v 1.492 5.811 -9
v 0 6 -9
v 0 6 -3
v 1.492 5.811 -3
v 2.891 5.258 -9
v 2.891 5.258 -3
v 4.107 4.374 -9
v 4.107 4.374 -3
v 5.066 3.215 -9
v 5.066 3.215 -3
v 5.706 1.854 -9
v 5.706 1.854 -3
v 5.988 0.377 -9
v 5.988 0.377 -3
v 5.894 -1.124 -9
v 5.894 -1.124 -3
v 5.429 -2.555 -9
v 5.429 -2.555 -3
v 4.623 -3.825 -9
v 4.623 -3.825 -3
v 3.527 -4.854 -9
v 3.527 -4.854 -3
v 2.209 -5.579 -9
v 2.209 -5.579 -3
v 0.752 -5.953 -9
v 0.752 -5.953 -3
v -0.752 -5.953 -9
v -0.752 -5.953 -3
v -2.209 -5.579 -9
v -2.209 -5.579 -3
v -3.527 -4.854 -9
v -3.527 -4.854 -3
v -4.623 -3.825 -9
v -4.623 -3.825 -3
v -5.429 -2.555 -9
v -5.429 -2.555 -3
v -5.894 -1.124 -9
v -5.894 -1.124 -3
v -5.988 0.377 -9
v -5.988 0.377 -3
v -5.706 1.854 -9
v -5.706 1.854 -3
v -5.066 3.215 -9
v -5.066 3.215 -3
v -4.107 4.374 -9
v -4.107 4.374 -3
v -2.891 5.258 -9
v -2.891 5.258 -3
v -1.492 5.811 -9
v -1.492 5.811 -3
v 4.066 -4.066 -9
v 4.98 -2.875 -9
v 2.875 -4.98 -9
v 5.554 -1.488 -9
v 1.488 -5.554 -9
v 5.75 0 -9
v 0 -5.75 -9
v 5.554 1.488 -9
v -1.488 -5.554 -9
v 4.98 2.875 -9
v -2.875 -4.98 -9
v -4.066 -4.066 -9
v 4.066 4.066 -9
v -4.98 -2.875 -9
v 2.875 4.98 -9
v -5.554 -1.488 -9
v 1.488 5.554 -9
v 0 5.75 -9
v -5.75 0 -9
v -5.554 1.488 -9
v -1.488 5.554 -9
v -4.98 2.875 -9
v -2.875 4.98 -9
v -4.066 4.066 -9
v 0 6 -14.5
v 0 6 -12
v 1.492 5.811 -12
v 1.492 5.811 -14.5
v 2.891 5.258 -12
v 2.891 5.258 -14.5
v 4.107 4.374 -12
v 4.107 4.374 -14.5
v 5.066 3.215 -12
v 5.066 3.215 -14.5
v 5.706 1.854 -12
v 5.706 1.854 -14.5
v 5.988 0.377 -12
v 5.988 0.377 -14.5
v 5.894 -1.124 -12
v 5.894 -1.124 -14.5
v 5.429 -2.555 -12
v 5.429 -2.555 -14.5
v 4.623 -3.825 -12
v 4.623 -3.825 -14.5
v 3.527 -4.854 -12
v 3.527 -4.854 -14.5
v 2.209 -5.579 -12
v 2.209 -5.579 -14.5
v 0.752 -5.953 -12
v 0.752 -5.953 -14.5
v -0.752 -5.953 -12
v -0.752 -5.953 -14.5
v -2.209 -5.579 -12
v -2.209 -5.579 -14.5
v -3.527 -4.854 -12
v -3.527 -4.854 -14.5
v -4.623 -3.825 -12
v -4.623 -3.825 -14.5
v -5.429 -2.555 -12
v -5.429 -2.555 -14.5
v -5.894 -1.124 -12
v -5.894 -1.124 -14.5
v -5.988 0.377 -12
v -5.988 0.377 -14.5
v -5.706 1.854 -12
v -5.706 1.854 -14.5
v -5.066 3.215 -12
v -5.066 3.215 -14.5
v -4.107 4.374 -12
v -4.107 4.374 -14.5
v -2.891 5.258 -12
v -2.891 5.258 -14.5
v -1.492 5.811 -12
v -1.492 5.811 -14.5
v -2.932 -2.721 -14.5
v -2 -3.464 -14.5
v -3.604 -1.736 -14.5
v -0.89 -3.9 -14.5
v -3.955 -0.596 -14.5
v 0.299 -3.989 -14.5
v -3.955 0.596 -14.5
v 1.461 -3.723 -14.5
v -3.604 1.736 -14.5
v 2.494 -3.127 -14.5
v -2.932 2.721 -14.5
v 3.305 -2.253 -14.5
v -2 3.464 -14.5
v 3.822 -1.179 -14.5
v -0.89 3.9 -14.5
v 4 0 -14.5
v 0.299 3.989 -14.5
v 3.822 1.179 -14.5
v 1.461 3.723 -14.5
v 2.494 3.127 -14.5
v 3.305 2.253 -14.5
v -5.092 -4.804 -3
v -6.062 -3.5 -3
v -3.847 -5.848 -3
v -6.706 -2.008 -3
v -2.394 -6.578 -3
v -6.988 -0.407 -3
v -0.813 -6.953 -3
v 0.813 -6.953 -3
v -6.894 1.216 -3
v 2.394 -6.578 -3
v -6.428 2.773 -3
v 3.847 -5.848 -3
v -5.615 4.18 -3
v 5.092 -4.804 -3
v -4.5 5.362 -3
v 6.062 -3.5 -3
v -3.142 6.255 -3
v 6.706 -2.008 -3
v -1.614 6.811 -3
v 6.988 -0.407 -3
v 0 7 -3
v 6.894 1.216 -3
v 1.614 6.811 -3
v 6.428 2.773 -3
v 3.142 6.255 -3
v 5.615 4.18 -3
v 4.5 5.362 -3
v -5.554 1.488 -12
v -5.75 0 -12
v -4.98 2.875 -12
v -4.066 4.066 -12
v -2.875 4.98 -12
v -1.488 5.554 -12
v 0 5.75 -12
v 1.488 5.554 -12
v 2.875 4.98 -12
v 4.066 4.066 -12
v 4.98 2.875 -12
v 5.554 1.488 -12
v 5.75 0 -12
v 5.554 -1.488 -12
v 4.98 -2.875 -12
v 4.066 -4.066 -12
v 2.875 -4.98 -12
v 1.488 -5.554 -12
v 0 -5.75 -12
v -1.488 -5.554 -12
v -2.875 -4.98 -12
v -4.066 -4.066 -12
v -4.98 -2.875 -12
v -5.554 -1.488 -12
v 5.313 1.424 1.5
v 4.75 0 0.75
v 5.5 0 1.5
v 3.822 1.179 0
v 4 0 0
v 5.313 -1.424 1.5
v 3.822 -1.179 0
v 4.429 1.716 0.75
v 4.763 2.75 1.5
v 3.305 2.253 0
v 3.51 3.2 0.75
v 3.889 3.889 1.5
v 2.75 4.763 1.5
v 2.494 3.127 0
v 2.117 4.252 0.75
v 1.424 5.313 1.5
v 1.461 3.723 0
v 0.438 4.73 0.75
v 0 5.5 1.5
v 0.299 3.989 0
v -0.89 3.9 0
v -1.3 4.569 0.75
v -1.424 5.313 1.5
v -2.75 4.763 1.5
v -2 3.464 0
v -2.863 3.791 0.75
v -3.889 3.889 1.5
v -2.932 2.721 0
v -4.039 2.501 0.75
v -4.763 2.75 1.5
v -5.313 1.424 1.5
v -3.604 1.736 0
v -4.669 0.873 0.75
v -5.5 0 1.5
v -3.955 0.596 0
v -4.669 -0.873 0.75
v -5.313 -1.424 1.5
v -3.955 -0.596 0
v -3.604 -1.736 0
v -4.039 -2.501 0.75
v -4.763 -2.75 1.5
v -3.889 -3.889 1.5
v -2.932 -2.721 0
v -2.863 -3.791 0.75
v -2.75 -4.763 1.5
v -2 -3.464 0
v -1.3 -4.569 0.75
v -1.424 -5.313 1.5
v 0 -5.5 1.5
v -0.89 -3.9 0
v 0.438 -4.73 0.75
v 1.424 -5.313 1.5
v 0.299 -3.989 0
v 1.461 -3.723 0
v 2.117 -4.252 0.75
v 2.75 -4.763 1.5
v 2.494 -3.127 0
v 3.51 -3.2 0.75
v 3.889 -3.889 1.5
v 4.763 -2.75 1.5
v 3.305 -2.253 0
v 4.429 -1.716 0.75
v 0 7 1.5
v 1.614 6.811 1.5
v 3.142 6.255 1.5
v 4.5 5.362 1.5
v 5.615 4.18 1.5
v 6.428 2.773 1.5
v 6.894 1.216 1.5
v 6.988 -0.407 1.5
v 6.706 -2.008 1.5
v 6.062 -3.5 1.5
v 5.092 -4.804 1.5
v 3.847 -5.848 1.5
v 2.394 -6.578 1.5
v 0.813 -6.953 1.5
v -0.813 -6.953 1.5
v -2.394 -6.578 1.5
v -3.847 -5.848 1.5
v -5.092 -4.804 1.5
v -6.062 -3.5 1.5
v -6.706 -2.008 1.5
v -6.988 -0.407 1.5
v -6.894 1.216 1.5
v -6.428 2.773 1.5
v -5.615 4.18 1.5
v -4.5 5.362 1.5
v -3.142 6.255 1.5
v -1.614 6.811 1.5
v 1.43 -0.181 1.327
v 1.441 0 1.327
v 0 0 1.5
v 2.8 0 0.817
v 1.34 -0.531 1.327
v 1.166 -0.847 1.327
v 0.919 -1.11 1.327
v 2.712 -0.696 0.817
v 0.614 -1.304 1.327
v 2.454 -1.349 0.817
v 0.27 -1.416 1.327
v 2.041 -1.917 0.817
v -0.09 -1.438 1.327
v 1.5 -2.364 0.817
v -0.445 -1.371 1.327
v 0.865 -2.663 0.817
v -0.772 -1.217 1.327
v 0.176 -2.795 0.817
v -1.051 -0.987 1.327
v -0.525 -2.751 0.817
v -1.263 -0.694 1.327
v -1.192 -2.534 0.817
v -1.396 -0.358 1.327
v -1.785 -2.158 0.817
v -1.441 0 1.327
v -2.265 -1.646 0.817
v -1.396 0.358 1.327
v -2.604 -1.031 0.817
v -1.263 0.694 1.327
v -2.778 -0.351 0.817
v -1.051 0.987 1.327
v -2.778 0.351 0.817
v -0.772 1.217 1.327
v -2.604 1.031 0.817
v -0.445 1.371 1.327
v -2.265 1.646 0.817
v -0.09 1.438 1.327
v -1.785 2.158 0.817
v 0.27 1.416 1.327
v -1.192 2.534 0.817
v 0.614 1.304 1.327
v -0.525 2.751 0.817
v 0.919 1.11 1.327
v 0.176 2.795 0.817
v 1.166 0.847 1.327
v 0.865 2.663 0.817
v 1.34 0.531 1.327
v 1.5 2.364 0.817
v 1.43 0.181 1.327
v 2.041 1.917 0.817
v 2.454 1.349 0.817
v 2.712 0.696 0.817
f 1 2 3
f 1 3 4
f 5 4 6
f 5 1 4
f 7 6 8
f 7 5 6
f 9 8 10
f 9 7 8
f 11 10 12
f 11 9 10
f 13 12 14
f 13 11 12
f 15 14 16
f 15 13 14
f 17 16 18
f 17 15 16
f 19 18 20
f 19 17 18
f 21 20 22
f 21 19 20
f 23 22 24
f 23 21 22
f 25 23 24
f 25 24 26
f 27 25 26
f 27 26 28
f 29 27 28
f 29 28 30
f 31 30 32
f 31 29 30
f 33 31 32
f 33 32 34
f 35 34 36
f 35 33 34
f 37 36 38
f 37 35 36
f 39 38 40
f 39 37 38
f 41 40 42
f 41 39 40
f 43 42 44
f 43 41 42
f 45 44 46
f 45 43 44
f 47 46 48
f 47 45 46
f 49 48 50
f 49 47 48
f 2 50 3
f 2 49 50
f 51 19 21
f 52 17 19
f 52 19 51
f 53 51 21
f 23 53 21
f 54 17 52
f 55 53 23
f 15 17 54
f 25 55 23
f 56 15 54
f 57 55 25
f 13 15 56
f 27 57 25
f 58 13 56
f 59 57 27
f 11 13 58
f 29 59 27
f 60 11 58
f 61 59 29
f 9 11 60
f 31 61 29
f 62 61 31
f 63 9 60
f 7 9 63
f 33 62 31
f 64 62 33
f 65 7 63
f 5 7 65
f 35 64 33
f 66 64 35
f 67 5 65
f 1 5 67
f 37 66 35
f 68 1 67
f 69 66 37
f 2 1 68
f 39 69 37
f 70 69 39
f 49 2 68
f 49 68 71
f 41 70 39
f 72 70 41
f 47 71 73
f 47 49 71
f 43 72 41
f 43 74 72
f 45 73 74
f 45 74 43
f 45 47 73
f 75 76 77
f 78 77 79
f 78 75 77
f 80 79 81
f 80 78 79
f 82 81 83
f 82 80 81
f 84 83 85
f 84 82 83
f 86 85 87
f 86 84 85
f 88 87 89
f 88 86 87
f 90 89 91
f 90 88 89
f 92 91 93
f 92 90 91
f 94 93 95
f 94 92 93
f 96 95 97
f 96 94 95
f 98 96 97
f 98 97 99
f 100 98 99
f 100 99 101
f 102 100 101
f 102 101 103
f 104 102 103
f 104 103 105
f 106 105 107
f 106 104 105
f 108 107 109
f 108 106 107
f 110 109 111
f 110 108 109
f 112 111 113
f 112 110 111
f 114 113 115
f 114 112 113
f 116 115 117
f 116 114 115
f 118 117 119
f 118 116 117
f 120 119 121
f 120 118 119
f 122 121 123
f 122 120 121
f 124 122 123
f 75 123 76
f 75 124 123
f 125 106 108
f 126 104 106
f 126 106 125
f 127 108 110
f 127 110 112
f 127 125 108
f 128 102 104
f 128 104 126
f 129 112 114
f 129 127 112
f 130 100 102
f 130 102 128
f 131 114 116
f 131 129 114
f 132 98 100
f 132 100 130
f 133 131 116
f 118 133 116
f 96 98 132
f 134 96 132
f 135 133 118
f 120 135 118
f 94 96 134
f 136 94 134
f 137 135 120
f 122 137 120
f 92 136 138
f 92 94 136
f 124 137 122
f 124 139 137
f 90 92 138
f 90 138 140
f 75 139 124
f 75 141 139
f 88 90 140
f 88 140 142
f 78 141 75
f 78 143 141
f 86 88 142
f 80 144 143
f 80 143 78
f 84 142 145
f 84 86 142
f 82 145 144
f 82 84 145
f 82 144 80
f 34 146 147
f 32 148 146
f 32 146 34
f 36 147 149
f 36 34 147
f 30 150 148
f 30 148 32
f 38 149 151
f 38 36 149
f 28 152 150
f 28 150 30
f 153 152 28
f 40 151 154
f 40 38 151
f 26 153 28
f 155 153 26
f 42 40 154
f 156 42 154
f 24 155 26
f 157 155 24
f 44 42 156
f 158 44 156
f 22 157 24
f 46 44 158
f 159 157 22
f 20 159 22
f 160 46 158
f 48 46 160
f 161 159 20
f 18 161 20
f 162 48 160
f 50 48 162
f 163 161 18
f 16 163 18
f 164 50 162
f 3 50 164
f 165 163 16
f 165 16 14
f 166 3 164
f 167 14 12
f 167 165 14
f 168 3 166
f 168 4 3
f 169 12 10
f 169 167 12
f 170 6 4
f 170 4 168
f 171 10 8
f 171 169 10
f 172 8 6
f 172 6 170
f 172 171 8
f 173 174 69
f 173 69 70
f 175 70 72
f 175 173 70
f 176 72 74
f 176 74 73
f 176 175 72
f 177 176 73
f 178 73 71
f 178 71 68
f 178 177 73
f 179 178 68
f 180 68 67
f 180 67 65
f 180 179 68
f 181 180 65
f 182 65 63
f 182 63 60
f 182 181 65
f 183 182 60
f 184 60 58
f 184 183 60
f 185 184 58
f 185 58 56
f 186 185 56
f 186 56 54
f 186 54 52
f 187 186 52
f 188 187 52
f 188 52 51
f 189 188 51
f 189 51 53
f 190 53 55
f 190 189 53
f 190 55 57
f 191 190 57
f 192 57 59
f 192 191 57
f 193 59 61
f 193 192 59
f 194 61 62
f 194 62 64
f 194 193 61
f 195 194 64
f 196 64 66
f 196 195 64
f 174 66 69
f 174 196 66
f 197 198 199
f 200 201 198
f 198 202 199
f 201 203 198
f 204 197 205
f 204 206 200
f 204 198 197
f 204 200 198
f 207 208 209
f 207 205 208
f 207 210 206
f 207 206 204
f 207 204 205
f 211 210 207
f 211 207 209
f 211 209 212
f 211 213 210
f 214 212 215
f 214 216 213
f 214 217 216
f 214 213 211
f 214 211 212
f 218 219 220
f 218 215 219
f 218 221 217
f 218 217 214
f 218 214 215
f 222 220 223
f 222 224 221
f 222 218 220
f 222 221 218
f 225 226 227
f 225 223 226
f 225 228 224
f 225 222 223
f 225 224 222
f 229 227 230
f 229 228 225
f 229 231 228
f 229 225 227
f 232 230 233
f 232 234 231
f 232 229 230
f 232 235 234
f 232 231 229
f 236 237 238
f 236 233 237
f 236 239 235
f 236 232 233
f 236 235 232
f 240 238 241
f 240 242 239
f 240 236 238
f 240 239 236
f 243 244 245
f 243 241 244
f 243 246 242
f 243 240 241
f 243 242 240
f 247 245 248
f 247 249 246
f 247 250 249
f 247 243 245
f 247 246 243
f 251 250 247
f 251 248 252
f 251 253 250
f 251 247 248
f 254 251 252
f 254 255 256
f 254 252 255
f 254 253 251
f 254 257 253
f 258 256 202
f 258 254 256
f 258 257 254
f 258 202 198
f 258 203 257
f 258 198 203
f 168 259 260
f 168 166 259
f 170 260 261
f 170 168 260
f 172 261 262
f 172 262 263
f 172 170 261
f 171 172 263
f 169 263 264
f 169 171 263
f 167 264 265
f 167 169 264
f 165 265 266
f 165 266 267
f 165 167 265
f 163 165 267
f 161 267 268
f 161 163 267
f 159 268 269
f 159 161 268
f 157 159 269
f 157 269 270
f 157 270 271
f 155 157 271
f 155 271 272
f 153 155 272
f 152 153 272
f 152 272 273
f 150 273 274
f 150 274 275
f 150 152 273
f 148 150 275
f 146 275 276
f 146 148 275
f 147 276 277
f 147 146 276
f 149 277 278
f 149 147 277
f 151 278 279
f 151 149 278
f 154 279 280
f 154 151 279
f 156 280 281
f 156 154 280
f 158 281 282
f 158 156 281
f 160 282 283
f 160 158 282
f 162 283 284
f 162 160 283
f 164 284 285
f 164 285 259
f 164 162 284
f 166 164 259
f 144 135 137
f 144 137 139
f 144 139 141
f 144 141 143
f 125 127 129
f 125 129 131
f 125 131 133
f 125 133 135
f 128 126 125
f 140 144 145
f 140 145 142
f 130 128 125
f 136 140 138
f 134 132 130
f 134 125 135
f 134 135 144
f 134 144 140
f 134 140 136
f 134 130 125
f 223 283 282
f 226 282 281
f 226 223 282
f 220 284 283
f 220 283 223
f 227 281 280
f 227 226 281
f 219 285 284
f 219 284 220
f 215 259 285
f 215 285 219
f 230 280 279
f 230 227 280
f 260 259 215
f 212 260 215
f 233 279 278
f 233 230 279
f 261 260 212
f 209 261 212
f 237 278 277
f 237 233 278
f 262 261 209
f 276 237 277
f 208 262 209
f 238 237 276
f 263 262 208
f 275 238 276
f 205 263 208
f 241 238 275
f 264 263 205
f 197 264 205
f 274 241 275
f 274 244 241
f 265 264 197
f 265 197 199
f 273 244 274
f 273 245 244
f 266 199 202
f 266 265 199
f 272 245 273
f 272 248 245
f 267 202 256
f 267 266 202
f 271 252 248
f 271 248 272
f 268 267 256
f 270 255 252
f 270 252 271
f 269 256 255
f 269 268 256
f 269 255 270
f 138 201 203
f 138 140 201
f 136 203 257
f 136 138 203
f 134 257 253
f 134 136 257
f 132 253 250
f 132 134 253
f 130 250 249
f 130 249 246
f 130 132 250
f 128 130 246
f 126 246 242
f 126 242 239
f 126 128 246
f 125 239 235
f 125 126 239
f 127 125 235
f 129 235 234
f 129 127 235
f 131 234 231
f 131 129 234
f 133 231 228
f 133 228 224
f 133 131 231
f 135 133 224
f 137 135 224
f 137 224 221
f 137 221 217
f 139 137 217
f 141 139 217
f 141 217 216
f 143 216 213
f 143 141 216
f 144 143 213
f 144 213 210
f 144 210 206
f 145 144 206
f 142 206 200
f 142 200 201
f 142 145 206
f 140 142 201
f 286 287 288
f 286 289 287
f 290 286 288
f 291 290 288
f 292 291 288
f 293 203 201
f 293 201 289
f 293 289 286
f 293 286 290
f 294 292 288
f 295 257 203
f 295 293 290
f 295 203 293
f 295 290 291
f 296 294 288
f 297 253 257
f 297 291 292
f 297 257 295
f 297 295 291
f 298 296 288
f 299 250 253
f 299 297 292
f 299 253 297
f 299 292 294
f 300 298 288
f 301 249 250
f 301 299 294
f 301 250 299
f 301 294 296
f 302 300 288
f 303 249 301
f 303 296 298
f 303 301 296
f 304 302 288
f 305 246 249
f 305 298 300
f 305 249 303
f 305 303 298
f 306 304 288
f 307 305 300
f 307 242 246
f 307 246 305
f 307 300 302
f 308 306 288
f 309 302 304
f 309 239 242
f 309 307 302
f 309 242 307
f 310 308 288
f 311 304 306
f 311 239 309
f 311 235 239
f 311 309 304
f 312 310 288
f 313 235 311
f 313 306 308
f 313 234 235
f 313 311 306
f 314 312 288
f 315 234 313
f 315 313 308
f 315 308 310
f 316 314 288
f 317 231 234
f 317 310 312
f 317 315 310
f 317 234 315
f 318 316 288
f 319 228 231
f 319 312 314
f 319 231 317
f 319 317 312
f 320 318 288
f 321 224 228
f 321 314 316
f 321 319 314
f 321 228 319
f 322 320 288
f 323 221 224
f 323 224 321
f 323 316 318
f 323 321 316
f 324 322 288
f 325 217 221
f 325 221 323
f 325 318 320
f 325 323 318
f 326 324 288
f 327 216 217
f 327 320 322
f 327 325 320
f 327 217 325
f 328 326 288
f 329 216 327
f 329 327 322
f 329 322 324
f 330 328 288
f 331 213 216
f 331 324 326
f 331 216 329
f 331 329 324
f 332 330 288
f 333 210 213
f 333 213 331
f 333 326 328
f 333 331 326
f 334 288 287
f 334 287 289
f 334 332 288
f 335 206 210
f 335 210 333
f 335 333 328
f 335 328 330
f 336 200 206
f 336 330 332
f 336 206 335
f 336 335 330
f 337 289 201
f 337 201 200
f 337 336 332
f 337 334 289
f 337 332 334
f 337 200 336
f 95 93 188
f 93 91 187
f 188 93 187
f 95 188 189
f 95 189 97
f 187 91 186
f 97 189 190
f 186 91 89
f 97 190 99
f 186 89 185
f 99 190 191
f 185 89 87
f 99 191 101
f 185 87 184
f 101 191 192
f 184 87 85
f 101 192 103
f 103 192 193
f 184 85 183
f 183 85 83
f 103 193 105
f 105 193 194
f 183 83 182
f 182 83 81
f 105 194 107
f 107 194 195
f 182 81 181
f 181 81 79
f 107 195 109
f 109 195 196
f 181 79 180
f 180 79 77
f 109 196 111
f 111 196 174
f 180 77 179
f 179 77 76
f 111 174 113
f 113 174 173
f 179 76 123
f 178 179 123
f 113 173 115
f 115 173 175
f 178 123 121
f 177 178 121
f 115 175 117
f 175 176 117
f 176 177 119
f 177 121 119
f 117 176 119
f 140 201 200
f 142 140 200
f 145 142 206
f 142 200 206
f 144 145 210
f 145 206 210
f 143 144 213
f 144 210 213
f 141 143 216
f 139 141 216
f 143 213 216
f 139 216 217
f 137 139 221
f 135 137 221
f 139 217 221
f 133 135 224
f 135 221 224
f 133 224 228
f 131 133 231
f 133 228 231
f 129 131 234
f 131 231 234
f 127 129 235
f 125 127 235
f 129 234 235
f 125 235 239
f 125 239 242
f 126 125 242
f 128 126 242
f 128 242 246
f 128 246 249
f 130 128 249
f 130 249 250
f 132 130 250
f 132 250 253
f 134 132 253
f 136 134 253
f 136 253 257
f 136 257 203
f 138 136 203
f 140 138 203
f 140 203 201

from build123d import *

# Parameters (mm, degrees)
SKETCH2_R          = 5.5
CUT_EXTRUDE1_DEPTH = 1.5
CUT_EXTRUDE1_TAPER = 45
SKETCH3_R          = 4
CUT_EXTRUDE2_DEPTH = 15.5
CUT_EXTRUDE3_START = -2.5
SKETCH6_R          = 6
SKETCH6_R_2        = 5.75
CUT_EXTRUDE3_DEPTH = 3


with BuildPart() as part:
    # Sketch1 → Revolve1 (revolve)
    with BuildSketch(Plane(origin=(0, 0, 0), x_dir=(0, 0, -1), z_dir=(1, 0, 0))):
        Polygon((-1.5, 0), (-1.5, 7), (3, 7), (3, 6), (14.5, 6), (14.5, 0), align=None)
    revolve(axis=Axis((0, 0, 1.5), (0, 0, -1)))

    # Sketch2 → Cut-Extrude1 (cut)
    with BuildSketch(Plane.XY.offset(1.5)):
        Circle(SKETCH2_R)
    extrude(amount=-CUT_EXTRUDE1_DEPTH, taper=CUT_EXTRUDE1_TAPER, mode=Mode.SUBTRACT)

    # Sketch3 → Cut-Extrude2 (cut, through all)
    with BuildSketch(Plane.XY):
        Circle(SKETCH3_R)
    extrude(amount=-CUT_EXTRUDE2_DEPTH, mode=Mode.SUBTRACT)

    # Sketch6 → Cut-Extrude3 (cut)
    with BuildSketch(Plane(origin=(0, 0, -14.5), x_dir=(-1, 0, 0), z_dir=(0, 0, -1)).offset(CUT_EXTRUDE3_START)):
        Circle(SKETCH6_R)
        Circle(SKETCH6_R_2, mode=Mode.SUBTRACT)
    extrude(amount=-CUT_EXTRUDE3_DEPTH, mode=Mode.SUBTRACT)


with BuildPart() as body_2:
    # Sketch4 → Revolve3 (revolve)
    with BuildSketch(Plane(origin=(0, 0, 0), x_dir=(1, 0, 0), z_dir=(0, 1, 0))):
        with BuildLine():
            Line((4, 0), (4, 14.5))
            Line((4, 14.5), (0, 14.5))
            Line((0, 14.5), (0, -1.5))
            ThreePointArc((0, -1.5), (2.136000936, -1.112669164), (4, 0))
        make_face()
    revolve(axis=Axis((0, 0, 1.5), (0, 0, -1)))


solid = Compound([part.part, body_2.part])
